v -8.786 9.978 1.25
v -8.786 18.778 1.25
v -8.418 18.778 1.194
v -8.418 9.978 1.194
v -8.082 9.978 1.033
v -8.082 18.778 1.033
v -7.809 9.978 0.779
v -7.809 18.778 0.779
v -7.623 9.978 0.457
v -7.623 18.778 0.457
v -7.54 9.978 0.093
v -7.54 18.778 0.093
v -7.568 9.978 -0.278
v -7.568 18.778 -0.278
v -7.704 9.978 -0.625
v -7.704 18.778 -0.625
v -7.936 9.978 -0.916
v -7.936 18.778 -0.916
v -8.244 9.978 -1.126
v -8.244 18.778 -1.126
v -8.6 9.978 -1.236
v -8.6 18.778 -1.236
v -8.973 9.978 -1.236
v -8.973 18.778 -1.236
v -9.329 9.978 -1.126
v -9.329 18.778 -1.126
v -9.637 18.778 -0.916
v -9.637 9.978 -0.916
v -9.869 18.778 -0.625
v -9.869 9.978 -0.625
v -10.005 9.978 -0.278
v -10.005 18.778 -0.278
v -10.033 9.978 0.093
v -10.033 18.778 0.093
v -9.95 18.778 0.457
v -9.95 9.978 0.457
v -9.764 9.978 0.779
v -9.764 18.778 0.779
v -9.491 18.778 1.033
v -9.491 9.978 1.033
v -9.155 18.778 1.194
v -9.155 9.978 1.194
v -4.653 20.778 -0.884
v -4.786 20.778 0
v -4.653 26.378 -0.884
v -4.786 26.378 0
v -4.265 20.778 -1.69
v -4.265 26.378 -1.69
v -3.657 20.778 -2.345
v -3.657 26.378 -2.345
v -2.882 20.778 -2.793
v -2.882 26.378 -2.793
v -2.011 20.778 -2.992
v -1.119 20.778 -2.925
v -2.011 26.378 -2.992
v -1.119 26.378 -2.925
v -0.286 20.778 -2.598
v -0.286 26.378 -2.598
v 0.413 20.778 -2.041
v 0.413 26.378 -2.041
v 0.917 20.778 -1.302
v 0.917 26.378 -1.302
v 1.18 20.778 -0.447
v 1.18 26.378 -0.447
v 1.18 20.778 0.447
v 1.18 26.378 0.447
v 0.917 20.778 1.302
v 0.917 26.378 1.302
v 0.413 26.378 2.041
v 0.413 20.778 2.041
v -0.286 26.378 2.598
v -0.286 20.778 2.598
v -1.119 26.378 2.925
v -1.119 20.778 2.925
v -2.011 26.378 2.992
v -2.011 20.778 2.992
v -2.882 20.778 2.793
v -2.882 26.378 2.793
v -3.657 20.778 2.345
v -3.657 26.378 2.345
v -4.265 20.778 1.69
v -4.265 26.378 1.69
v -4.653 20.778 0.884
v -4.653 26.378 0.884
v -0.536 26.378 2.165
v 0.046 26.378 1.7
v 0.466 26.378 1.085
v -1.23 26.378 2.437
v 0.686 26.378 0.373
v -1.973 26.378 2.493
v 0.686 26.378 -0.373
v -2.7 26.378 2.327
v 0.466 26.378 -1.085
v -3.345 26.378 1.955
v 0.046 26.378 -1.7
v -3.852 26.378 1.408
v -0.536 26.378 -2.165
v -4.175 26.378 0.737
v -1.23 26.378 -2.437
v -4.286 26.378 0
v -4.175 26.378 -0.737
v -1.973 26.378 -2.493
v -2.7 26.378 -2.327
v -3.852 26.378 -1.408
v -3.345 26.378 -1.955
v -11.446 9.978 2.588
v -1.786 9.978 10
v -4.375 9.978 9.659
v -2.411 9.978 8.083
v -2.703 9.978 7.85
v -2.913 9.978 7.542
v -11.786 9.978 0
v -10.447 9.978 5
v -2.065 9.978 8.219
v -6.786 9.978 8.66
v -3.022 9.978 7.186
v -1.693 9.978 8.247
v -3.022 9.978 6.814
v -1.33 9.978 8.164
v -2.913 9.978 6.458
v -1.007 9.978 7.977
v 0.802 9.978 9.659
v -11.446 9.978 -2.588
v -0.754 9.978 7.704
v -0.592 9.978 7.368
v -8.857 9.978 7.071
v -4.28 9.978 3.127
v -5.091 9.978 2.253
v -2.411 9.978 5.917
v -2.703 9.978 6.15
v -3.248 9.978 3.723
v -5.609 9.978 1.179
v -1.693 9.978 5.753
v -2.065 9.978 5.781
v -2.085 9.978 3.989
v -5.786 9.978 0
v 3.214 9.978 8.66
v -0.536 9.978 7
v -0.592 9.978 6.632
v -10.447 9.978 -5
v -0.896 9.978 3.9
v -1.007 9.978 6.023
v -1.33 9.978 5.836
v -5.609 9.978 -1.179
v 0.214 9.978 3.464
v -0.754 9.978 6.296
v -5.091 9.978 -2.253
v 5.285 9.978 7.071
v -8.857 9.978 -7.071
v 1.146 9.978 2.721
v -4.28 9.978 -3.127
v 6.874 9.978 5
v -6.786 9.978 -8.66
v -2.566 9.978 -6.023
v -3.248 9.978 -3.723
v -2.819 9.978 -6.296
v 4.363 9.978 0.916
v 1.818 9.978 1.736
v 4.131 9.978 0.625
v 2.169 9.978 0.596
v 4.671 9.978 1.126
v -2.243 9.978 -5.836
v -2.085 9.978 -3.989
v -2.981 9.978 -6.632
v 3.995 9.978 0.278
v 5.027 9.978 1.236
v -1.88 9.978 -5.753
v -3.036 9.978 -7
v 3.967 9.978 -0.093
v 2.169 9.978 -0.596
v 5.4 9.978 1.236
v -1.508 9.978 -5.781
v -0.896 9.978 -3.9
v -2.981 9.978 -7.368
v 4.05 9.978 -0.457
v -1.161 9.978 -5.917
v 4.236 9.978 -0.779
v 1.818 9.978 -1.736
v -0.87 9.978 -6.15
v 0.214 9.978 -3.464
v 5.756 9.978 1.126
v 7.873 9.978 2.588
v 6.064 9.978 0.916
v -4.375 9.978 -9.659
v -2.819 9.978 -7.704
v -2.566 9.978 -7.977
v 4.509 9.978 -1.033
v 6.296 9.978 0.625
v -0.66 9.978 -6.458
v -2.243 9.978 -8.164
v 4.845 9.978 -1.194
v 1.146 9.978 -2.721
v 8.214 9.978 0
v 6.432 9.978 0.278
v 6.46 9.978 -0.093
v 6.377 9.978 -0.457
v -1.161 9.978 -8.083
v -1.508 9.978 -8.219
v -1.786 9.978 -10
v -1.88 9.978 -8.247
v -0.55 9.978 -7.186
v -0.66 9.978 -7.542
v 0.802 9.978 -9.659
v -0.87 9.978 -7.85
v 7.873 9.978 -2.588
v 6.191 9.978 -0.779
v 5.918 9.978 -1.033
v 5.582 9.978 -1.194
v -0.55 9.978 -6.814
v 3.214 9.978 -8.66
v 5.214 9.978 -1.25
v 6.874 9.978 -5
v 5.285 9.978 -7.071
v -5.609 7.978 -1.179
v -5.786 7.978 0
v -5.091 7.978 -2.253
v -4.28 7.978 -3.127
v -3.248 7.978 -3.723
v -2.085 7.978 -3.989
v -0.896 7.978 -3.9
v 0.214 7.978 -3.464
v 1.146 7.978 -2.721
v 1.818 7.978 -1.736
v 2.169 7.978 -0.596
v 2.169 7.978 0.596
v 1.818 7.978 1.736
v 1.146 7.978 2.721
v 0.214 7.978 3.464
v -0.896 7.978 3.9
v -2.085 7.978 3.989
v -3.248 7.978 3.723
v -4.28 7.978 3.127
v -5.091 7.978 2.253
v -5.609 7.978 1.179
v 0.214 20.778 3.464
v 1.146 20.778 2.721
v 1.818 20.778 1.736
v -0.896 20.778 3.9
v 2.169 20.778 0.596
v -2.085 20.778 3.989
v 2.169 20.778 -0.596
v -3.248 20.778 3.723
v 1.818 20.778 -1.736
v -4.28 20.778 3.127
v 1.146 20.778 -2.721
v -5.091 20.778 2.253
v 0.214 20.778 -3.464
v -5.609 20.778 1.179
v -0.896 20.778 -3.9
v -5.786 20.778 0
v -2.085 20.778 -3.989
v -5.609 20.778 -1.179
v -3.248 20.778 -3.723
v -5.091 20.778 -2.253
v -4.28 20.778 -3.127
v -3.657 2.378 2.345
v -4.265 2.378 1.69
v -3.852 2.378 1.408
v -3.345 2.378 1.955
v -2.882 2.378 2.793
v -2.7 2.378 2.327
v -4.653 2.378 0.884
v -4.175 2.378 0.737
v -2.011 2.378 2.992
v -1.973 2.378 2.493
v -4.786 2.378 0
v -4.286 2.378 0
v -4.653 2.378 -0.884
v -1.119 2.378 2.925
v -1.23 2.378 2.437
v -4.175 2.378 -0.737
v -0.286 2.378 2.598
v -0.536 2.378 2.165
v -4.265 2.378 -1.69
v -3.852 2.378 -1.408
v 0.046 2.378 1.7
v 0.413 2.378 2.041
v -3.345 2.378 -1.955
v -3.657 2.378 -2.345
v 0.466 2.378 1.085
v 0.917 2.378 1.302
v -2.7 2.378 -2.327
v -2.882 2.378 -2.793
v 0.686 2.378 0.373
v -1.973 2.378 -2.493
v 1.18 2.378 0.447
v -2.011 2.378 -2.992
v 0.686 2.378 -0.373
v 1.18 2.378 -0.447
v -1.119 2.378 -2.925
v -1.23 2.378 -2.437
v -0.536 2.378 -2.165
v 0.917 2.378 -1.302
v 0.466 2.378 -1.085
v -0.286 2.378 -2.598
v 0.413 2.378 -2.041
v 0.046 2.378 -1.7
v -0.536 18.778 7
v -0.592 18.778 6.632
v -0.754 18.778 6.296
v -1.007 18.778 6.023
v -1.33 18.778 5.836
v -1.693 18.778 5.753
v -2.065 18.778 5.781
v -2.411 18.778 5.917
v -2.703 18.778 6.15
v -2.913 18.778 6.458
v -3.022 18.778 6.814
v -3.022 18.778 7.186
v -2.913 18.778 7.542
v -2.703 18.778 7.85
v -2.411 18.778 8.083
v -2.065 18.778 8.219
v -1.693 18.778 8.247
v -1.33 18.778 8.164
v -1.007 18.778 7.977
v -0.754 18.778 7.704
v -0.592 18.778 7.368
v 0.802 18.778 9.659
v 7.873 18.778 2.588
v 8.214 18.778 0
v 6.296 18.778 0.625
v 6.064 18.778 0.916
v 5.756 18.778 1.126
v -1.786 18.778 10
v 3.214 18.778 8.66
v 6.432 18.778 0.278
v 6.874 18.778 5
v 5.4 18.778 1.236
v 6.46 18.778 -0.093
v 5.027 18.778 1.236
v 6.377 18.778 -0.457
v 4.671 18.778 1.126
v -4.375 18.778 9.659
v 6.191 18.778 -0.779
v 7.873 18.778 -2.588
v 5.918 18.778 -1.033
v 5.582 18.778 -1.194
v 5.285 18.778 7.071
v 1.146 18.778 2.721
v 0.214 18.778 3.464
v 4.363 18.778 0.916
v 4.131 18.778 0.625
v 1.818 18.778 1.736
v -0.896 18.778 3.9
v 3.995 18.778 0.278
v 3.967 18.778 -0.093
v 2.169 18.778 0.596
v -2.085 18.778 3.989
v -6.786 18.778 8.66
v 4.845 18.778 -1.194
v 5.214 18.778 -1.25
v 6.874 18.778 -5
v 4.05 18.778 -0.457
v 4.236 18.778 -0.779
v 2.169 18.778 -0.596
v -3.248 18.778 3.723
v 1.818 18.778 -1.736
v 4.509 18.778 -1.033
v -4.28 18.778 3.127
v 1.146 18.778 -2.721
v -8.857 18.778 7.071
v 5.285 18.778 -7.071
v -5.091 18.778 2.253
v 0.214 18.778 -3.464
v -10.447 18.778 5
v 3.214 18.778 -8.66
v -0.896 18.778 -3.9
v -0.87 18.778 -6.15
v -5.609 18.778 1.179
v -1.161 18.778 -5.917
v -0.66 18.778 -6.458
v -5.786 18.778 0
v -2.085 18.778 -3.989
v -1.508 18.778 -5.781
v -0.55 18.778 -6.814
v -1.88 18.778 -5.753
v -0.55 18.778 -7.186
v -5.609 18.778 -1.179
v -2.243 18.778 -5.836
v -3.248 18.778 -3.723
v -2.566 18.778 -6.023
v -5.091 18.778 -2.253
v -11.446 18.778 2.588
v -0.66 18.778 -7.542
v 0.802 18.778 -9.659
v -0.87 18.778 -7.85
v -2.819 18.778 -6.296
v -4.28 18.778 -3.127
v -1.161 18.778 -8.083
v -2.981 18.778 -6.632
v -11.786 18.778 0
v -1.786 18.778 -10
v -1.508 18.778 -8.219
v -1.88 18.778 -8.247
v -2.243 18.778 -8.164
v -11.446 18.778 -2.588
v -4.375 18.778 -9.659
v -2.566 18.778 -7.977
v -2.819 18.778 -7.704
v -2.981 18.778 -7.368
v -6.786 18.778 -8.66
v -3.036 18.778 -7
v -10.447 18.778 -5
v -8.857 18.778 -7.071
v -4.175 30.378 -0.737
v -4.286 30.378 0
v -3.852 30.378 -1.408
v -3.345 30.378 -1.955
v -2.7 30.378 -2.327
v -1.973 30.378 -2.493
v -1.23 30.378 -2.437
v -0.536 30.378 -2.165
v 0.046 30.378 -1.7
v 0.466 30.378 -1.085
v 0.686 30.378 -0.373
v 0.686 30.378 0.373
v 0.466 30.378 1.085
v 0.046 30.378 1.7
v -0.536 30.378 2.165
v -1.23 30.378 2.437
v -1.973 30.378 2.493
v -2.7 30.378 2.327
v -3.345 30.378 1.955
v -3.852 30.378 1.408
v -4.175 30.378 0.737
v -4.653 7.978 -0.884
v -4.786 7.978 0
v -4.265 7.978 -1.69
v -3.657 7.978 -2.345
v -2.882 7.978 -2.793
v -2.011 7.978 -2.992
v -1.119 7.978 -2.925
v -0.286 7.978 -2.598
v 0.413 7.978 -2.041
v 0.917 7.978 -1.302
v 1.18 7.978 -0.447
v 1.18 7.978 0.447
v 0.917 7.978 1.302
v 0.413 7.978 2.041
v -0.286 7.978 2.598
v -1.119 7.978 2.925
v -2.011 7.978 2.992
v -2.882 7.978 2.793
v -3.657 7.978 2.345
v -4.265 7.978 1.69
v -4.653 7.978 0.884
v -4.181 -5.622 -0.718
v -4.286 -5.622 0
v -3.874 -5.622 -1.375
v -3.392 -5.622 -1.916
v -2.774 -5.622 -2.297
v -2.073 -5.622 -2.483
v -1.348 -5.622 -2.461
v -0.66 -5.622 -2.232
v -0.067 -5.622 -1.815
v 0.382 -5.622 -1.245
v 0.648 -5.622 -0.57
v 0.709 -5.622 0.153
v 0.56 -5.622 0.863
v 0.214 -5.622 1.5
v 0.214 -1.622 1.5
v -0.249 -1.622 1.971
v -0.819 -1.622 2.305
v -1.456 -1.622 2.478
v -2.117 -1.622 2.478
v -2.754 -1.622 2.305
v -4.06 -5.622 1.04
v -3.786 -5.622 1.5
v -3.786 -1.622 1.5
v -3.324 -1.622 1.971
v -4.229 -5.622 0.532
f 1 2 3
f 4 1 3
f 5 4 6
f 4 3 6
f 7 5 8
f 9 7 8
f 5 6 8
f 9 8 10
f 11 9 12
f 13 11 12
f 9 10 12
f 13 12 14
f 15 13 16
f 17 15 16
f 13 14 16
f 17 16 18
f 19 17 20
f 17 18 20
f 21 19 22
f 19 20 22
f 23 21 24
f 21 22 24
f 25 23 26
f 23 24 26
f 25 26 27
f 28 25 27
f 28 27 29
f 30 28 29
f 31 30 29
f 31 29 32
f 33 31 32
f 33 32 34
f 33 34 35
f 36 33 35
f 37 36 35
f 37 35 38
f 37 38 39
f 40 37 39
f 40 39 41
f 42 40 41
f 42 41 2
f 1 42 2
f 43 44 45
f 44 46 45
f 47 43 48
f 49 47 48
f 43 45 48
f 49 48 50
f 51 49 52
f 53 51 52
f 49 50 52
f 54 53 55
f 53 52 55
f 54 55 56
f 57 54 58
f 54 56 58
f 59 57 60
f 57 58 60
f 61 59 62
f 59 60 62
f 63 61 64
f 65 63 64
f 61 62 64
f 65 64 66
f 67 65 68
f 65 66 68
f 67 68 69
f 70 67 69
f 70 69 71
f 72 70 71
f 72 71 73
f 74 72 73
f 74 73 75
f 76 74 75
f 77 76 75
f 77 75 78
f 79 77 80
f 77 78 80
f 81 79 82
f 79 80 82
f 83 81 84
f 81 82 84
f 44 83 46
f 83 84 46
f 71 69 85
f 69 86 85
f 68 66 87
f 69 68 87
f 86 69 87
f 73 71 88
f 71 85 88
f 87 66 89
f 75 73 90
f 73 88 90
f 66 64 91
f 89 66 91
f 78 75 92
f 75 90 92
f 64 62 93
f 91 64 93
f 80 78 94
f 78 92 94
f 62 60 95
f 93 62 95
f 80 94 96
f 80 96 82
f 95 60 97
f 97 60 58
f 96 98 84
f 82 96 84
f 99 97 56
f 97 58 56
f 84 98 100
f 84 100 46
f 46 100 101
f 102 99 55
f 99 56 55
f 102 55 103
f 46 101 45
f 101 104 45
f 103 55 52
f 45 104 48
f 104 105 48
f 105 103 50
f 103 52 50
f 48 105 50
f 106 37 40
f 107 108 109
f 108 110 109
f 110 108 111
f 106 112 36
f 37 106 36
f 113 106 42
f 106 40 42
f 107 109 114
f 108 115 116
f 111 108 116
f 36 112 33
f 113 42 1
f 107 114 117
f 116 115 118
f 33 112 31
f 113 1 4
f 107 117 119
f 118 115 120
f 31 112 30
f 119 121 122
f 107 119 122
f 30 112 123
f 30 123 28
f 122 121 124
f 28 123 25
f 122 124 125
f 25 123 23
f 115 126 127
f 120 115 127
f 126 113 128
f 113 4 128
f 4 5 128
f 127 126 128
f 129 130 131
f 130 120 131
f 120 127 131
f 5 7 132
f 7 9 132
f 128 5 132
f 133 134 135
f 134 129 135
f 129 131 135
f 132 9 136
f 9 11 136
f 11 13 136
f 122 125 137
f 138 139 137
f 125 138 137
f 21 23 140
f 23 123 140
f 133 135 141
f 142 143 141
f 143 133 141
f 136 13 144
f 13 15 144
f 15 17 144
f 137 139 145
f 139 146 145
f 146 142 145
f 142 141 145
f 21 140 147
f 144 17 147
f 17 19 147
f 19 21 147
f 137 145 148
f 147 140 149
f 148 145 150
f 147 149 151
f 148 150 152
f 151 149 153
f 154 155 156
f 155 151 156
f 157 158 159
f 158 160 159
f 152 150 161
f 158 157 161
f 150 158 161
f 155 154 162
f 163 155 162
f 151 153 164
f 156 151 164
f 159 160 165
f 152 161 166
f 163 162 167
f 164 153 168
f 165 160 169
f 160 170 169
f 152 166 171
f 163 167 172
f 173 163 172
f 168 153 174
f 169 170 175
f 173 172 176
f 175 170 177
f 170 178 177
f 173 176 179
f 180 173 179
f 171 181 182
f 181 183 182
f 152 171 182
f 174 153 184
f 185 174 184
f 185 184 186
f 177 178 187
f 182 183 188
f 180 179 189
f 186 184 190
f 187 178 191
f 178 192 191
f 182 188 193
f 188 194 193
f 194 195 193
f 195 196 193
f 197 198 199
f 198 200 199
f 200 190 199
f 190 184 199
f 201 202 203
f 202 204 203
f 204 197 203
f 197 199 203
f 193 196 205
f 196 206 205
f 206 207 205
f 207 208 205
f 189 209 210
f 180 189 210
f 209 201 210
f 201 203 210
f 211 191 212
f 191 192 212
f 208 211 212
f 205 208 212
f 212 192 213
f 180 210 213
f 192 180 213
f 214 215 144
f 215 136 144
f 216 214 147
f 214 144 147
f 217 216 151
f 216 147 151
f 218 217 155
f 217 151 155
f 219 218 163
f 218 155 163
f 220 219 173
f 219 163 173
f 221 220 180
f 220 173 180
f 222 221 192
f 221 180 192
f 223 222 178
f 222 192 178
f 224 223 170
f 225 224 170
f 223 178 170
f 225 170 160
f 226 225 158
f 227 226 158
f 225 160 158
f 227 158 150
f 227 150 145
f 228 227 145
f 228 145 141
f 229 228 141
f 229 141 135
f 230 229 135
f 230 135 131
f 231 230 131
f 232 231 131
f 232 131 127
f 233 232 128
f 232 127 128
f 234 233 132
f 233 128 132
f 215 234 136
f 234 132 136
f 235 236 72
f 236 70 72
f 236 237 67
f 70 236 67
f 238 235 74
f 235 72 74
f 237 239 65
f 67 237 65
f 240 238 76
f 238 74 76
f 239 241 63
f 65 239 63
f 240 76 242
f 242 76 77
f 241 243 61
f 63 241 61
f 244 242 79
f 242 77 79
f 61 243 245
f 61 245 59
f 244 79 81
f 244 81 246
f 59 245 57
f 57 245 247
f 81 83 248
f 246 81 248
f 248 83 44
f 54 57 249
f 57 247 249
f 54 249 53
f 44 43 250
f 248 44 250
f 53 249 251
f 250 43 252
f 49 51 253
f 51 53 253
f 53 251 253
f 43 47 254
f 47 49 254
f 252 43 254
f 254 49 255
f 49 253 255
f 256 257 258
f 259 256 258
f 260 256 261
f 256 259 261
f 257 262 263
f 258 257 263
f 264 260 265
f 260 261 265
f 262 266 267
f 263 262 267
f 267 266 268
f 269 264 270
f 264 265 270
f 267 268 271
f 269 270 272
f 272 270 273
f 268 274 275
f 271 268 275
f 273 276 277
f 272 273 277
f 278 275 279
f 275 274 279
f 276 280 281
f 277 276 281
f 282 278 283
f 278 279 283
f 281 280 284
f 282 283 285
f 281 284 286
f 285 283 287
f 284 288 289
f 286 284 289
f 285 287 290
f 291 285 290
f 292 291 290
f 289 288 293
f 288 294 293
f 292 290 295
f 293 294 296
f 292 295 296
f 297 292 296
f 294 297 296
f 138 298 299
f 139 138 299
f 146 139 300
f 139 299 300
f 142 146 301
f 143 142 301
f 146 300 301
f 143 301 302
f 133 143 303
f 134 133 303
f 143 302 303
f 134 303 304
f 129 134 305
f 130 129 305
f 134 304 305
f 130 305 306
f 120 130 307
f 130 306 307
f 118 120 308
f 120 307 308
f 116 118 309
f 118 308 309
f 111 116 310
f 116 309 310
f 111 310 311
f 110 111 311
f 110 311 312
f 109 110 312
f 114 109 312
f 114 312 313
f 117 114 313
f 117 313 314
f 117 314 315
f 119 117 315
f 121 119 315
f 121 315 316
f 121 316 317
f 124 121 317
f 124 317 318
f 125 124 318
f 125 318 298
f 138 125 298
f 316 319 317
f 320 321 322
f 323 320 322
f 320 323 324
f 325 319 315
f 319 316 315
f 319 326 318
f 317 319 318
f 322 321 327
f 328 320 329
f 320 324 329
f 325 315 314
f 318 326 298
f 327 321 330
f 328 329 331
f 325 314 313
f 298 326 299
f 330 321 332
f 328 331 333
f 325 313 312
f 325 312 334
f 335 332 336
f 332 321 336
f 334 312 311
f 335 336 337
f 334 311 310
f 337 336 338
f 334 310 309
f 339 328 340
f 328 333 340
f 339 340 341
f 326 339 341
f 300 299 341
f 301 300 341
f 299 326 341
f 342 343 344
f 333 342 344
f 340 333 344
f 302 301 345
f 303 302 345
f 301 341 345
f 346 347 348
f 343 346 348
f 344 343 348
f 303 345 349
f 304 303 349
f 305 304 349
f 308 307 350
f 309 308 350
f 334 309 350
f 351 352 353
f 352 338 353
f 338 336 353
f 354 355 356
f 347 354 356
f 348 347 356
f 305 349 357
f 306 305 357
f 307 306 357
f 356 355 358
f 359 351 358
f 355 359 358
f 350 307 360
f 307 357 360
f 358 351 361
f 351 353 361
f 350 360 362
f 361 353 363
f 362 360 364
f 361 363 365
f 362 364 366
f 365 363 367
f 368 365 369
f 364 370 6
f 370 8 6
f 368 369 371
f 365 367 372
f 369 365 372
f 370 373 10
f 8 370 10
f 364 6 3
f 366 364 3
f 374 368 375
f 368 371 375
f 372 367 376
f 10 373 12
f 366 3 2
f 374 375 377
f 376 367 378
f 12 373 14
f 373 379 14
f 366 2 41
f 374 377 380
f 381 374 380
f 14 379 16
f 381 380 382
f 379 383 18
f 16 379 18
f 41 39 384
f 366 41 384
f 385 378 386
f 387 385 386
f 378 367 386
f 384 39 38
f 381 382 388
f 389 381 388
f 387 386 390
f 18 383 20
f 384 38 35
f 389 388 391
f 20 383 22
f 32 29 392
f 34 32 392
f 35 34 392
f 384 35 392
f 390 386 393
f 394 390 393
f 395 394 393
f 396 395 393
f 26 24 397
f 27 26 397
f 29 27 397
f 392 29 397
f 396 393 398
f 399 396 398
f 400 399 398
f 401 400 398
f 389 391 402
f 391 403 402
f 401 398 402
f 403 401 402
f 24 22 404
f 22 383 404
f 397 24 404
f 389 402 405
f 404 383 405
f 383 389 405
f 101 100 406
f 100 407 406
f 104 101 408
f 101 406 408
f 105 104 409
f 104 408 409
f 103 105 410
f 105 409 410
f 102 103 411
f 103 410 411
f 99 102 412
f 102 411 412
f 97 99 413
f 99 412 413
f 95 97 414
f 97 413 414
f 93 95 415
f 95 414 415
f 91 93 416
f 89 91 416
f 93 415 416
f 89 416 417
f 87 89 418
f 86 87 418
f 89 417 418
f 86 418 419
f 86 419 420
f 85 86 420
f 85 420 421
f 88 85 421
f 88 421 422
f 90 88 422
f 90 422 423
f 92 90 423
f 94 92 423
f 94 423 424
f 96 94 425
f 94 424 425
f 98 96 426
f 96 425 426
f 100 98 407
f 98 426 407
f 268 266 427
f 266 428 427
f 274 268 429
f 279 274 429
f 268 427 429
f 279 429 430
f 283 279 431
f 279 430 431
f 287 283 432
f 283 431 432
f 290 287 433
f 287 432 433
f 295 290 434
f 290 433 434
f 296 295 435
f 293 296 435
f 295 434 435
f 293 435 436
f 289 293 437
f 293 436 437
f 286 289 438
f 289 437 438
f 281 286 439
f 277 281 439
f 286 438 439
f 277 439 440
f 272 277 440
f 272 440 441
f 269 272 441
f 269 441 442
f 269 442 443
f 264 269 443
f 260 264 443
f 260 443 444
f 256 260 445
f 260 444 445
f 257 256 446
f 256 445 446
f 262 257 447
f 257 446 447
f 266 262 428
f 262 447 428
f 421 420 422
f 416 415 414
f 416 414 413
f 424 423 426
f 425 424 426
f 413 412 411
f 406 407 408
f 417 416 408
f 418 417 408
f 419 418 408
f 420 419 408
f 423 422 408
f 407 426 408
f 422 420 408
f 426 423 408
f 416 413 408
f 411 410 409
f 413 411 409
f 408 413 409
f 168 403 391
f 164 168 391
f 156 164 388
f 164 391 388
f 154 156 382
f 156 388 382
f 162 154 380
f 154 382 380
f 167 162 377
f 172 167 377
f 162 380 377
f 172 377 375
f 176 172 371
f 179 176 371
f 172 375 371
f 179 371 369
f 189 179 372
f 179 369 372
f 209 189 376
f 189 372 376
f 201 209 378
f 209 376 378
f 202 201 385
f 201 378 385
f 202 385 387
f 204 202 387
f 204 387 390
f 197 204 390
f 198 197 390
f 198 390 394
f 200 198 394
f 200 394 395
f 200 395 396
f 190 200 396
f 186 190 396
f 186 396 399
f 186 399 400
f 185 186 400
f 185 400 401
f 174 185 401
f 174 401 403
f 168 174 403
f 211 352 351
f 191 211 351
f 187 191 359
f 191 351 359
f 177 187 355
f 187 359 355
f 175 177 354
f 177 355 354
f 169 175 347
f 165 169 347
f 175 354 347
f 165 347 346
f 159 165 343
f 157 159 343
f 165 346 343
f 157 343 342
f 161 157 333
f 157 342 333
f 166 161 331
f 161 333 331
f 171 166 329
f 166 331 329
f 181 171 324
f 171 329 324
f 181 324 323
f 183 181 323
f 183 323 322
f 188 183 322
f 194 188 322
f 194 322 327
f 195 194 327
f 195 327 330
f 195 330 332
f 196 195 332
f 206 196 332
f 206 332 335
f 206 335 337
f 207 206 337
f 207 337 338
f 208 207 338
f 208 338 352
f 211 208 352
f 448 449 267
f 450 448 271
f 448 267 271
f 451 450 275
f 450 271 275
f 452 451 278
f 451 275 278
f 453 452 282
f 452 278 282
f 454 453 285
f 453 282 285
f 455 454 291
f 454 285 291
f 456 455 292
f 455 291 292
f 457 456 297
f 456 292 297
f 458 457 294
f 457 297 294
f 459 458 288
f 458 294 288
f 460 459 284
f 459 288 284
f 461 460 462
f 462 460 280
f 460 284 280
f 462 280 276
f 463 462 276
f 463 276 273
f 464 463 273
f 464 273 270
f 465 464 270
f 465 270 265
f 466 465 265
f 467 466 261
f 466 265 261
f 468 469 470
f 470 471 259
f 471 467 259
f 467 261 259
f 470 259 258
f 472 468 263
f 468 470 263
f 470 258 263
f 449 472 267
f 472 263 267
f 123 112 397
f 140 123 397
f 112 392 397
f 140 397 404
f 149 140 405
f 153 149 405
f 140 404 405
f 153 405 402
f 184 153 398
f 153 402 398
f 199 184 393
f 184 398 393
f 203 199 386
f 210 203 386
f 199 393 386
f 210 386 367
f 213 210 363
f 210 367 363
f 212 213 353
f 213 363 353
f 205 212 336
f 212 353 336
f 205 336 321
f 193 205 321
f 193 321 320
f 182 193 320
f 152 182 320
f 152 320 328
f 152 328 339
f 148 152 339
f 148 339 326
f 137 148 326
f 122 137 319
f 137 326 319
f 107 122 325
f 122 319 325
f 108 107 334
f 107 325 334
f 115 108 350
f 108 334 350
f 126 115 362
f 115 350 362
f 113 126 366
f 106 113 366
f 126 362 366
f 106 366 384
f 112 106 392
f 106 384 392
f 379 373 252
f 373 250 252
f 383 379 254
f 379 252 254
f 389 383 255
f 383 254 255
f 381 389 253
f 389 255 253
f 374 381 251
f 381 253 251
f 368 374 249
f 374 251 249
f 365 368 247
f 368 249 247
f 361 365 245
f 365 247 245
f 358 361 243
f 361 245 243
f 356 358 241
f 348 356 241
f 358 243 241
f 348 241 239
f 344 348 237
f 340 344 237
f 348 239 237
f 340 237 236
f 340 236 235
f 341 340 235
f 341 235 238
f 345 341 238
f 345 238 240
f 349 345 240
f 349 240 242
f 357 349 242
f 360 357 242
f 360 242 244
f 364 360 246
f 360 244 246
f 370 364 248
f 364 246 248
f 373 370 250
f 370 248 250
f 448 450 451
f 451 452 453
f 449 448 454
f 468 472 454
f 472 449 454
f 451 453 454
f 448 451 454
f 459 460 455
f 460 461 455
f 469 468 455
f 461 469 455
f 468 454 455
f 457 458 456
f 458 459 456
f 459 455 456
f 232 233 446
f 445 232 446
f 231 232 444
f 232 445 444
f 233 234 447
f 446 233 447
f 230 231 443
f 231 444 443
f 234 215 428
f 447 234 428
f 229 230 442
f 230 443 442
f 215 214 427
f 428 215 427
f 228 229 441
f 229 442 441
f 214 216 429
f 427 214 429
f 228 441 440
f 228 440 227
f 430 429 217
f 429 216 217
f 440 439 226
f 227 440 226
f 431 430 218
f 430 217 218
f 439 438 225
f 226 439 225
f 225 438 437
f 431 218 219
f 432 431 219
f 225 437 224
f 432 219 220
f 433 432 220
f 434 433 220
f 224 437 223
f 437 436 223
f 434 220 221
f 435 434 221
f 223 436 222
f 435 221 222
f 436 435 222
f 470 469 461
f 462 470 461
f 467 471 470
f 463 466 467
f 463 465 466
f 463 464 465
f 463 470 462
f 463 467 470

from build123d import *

# Parameters (mm, degrees)
HOLE_WIZARD_M3_1_D       = 2.5
PATTERN_CIRCULAR_1_COUNT = 4
CUT_EXTRUDE_1_DEPTH      = 4


with BuildPart() as part:
    # Model → 旋转1 (revolve)
    with BuildSketch(Plane.XY, mode=Mode.PRIVATE) as revolve_1_sk:
        Polygon((-1.786351506, 30.377960803), (-1.786351506, -5.622039197), (0.713648494, -5.622039197), (0.713648494, 2.377960803), (1.213648494, 2.377960803), (1.213648494, 7.977960803), (2.213648494, 7.977960803), (2.213648494, 9.977960803), (8.213648494, 9.977960803), (8.213648494, 18.777960803), (2.213648494, 18.777960803), (2.213648494, 20.777960803), (1.213648494, 20.777960803), (1.213648494, 26.377960803), (0.713648494, 26.377960803), (0.713648494, 30.377960803), align=None)
    revolve(revolve_1_sk.sketch.rotate(Axis((-1.786351506, 30.377960803, 0), (0, -1, 0)), 180), axis=Axis((-1.786351506, 30.377960803, 0), (0, -1, 0)))

    # M3 螺纹孔1 (through all)
    with Locations(Plane(origin=(-1.786351506, 9.977960803, 7), x_dir=(-1, 0, 0), z_dir=(0, -1, 0))):
        with Locations((0, 0)):
            hole_wizard_m3_1 = Hole(HOLE_WIZARD_M3_1_D / 2)

    # 阵列(圆周)1: M3 螺纹孔1 ×4 about axis
    pattern_circular_1_axis = Axis((-1.786351506, 0, 0), (0, 1, 0))
    for i in range(1, PATTERN_CIRCULAR_1_COUNT):
        add(hole_wizard_m3_1.rotate(pattern_circular_1_axis, i * 360 / PATTERN_CIRCULAR_1_COUNT), mode=Mode.SUBTRACT)

    # 草图5 → 切除-拉伸1 (cut)
    with BuildSketch(Plane.XZ.offset(5.622039197)):
        Polygon((-3.786351506, 1.5), (0.213648494, 1.5), (0.213648494, 5.333306347), (-4.133002322, 4.430820446), align=None)
    extrude(amount=-CUT_EXTRUDE_1_DEPTH, mode=Mode.SUBTRACT)


solid = part.part
